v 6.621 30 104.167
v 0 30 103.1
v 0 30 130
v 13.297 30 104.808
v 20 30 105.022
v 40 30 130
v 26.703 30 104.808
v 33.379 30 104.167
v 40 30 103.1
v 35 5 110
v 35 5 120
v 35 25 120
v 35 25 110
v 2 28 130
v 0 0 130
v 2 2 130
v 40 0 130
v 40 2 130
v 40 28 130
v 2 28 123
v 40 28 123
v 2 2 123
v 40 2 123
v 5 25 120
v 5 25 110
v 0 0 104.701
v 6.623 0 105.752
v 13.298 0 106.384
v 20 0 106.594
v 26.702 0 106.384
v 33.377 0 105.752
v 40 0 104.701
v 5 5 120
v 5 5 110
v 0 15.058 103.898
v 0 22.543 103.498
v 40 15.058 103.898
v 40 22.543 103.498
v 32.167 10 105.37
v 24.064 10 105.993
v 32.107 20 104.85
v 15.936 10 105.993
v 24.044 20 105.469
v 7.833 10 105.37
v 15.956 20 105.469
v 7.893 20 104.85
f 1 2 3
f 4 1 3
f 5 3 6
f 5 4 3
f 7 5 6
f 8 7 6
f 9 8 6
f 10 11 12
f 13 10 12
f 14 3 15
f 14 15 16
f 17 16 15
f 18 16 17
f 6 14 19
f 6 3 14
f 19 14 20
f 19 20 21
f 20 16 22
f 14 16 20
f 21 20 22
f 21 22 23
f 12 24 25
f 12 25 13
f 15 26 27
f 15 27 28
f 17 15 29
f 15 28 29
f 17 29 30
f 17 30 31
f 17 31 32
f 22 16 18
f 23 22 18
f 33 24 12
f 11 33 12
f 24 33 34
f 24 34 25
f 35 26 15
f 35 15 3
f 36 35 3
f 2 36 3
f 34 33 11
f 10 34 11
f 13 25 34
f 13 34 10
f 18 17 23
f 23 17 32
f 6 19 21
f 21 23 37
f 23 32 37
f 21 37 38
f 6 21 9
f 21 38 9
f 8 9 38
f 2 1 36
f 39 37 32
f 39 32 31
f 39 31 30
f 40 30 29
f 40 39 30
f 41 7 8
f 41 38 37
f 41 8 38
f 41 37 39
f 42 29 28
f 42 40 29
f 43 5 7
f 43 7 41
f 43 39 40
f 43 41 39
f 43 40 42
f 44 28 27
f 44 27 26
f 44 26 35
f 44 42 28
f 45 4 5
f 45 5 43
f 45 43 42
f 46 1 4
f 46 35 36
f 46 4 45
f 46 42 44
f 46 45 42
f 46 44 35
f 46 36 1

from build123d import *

# Parameters (mm, degrees)
SKETCH1_W           = 40
SKETCH1_H           = 30
BOSS_EXTRUDE1_DEPTH = 130
SKETCH6_W           = 30
SKETCH6_H           = 20
CUT_EXTRUDE1_DEPTH  = 10
SKETCH7_W           = 38
SKETCH7_H           = 26
CUT_EXTRUDE2_DEPTH  = 7


with BuildPart() as part:
    # Sketch1 → Boss-Extrude1 (new body)
    with BuildSketch(Plane.XY):
        with Locations((20, 15)):
            Rectangle(SKETCH1_W, SKETCH1_H)
    extrude(amount=BOSS_EXTRUDE1_DEPTH)

    # Sketch4 → Cut-Revolve1 (revolve, cut)
    with BuildSketch(Plane(origin=(20, 0, 0), x_dir=(0, 0, -1), z_dir=(1, 0, 0))):
        Polygon((0, 60), (0, -170), (-115.503789235, -170), (-103.45, 60), align=None)
    revolve(axis=Axis((20, 60, 0), (0, -1, 0)), mode=Mode.SUBTRACT)

    # Sketch6 → Cut-Extrude1 (cut)
    with BuildSketch(Plane.XY.offset(120)):
        with Locations((20, 15)):
            Rectangle(SKETCH6_W, SKETCH6_H)
    extrude(amount=-CUT_EXTRUDE1_DEPTH, mode=Mode.SUBTRACT)

    # Sketch7 → Cut-Extrude2 (cut)
    with BuildSketch(Plane.XY.offset(130)):
        with Locations((21, 15)):
            Rectangle(SKETCH7_W, SKETCH7_H)
    extrude(amount=-CUT_EXTRUDE2_DEPTH, mode=Mode.SUBTRACT)


solid = part.part
